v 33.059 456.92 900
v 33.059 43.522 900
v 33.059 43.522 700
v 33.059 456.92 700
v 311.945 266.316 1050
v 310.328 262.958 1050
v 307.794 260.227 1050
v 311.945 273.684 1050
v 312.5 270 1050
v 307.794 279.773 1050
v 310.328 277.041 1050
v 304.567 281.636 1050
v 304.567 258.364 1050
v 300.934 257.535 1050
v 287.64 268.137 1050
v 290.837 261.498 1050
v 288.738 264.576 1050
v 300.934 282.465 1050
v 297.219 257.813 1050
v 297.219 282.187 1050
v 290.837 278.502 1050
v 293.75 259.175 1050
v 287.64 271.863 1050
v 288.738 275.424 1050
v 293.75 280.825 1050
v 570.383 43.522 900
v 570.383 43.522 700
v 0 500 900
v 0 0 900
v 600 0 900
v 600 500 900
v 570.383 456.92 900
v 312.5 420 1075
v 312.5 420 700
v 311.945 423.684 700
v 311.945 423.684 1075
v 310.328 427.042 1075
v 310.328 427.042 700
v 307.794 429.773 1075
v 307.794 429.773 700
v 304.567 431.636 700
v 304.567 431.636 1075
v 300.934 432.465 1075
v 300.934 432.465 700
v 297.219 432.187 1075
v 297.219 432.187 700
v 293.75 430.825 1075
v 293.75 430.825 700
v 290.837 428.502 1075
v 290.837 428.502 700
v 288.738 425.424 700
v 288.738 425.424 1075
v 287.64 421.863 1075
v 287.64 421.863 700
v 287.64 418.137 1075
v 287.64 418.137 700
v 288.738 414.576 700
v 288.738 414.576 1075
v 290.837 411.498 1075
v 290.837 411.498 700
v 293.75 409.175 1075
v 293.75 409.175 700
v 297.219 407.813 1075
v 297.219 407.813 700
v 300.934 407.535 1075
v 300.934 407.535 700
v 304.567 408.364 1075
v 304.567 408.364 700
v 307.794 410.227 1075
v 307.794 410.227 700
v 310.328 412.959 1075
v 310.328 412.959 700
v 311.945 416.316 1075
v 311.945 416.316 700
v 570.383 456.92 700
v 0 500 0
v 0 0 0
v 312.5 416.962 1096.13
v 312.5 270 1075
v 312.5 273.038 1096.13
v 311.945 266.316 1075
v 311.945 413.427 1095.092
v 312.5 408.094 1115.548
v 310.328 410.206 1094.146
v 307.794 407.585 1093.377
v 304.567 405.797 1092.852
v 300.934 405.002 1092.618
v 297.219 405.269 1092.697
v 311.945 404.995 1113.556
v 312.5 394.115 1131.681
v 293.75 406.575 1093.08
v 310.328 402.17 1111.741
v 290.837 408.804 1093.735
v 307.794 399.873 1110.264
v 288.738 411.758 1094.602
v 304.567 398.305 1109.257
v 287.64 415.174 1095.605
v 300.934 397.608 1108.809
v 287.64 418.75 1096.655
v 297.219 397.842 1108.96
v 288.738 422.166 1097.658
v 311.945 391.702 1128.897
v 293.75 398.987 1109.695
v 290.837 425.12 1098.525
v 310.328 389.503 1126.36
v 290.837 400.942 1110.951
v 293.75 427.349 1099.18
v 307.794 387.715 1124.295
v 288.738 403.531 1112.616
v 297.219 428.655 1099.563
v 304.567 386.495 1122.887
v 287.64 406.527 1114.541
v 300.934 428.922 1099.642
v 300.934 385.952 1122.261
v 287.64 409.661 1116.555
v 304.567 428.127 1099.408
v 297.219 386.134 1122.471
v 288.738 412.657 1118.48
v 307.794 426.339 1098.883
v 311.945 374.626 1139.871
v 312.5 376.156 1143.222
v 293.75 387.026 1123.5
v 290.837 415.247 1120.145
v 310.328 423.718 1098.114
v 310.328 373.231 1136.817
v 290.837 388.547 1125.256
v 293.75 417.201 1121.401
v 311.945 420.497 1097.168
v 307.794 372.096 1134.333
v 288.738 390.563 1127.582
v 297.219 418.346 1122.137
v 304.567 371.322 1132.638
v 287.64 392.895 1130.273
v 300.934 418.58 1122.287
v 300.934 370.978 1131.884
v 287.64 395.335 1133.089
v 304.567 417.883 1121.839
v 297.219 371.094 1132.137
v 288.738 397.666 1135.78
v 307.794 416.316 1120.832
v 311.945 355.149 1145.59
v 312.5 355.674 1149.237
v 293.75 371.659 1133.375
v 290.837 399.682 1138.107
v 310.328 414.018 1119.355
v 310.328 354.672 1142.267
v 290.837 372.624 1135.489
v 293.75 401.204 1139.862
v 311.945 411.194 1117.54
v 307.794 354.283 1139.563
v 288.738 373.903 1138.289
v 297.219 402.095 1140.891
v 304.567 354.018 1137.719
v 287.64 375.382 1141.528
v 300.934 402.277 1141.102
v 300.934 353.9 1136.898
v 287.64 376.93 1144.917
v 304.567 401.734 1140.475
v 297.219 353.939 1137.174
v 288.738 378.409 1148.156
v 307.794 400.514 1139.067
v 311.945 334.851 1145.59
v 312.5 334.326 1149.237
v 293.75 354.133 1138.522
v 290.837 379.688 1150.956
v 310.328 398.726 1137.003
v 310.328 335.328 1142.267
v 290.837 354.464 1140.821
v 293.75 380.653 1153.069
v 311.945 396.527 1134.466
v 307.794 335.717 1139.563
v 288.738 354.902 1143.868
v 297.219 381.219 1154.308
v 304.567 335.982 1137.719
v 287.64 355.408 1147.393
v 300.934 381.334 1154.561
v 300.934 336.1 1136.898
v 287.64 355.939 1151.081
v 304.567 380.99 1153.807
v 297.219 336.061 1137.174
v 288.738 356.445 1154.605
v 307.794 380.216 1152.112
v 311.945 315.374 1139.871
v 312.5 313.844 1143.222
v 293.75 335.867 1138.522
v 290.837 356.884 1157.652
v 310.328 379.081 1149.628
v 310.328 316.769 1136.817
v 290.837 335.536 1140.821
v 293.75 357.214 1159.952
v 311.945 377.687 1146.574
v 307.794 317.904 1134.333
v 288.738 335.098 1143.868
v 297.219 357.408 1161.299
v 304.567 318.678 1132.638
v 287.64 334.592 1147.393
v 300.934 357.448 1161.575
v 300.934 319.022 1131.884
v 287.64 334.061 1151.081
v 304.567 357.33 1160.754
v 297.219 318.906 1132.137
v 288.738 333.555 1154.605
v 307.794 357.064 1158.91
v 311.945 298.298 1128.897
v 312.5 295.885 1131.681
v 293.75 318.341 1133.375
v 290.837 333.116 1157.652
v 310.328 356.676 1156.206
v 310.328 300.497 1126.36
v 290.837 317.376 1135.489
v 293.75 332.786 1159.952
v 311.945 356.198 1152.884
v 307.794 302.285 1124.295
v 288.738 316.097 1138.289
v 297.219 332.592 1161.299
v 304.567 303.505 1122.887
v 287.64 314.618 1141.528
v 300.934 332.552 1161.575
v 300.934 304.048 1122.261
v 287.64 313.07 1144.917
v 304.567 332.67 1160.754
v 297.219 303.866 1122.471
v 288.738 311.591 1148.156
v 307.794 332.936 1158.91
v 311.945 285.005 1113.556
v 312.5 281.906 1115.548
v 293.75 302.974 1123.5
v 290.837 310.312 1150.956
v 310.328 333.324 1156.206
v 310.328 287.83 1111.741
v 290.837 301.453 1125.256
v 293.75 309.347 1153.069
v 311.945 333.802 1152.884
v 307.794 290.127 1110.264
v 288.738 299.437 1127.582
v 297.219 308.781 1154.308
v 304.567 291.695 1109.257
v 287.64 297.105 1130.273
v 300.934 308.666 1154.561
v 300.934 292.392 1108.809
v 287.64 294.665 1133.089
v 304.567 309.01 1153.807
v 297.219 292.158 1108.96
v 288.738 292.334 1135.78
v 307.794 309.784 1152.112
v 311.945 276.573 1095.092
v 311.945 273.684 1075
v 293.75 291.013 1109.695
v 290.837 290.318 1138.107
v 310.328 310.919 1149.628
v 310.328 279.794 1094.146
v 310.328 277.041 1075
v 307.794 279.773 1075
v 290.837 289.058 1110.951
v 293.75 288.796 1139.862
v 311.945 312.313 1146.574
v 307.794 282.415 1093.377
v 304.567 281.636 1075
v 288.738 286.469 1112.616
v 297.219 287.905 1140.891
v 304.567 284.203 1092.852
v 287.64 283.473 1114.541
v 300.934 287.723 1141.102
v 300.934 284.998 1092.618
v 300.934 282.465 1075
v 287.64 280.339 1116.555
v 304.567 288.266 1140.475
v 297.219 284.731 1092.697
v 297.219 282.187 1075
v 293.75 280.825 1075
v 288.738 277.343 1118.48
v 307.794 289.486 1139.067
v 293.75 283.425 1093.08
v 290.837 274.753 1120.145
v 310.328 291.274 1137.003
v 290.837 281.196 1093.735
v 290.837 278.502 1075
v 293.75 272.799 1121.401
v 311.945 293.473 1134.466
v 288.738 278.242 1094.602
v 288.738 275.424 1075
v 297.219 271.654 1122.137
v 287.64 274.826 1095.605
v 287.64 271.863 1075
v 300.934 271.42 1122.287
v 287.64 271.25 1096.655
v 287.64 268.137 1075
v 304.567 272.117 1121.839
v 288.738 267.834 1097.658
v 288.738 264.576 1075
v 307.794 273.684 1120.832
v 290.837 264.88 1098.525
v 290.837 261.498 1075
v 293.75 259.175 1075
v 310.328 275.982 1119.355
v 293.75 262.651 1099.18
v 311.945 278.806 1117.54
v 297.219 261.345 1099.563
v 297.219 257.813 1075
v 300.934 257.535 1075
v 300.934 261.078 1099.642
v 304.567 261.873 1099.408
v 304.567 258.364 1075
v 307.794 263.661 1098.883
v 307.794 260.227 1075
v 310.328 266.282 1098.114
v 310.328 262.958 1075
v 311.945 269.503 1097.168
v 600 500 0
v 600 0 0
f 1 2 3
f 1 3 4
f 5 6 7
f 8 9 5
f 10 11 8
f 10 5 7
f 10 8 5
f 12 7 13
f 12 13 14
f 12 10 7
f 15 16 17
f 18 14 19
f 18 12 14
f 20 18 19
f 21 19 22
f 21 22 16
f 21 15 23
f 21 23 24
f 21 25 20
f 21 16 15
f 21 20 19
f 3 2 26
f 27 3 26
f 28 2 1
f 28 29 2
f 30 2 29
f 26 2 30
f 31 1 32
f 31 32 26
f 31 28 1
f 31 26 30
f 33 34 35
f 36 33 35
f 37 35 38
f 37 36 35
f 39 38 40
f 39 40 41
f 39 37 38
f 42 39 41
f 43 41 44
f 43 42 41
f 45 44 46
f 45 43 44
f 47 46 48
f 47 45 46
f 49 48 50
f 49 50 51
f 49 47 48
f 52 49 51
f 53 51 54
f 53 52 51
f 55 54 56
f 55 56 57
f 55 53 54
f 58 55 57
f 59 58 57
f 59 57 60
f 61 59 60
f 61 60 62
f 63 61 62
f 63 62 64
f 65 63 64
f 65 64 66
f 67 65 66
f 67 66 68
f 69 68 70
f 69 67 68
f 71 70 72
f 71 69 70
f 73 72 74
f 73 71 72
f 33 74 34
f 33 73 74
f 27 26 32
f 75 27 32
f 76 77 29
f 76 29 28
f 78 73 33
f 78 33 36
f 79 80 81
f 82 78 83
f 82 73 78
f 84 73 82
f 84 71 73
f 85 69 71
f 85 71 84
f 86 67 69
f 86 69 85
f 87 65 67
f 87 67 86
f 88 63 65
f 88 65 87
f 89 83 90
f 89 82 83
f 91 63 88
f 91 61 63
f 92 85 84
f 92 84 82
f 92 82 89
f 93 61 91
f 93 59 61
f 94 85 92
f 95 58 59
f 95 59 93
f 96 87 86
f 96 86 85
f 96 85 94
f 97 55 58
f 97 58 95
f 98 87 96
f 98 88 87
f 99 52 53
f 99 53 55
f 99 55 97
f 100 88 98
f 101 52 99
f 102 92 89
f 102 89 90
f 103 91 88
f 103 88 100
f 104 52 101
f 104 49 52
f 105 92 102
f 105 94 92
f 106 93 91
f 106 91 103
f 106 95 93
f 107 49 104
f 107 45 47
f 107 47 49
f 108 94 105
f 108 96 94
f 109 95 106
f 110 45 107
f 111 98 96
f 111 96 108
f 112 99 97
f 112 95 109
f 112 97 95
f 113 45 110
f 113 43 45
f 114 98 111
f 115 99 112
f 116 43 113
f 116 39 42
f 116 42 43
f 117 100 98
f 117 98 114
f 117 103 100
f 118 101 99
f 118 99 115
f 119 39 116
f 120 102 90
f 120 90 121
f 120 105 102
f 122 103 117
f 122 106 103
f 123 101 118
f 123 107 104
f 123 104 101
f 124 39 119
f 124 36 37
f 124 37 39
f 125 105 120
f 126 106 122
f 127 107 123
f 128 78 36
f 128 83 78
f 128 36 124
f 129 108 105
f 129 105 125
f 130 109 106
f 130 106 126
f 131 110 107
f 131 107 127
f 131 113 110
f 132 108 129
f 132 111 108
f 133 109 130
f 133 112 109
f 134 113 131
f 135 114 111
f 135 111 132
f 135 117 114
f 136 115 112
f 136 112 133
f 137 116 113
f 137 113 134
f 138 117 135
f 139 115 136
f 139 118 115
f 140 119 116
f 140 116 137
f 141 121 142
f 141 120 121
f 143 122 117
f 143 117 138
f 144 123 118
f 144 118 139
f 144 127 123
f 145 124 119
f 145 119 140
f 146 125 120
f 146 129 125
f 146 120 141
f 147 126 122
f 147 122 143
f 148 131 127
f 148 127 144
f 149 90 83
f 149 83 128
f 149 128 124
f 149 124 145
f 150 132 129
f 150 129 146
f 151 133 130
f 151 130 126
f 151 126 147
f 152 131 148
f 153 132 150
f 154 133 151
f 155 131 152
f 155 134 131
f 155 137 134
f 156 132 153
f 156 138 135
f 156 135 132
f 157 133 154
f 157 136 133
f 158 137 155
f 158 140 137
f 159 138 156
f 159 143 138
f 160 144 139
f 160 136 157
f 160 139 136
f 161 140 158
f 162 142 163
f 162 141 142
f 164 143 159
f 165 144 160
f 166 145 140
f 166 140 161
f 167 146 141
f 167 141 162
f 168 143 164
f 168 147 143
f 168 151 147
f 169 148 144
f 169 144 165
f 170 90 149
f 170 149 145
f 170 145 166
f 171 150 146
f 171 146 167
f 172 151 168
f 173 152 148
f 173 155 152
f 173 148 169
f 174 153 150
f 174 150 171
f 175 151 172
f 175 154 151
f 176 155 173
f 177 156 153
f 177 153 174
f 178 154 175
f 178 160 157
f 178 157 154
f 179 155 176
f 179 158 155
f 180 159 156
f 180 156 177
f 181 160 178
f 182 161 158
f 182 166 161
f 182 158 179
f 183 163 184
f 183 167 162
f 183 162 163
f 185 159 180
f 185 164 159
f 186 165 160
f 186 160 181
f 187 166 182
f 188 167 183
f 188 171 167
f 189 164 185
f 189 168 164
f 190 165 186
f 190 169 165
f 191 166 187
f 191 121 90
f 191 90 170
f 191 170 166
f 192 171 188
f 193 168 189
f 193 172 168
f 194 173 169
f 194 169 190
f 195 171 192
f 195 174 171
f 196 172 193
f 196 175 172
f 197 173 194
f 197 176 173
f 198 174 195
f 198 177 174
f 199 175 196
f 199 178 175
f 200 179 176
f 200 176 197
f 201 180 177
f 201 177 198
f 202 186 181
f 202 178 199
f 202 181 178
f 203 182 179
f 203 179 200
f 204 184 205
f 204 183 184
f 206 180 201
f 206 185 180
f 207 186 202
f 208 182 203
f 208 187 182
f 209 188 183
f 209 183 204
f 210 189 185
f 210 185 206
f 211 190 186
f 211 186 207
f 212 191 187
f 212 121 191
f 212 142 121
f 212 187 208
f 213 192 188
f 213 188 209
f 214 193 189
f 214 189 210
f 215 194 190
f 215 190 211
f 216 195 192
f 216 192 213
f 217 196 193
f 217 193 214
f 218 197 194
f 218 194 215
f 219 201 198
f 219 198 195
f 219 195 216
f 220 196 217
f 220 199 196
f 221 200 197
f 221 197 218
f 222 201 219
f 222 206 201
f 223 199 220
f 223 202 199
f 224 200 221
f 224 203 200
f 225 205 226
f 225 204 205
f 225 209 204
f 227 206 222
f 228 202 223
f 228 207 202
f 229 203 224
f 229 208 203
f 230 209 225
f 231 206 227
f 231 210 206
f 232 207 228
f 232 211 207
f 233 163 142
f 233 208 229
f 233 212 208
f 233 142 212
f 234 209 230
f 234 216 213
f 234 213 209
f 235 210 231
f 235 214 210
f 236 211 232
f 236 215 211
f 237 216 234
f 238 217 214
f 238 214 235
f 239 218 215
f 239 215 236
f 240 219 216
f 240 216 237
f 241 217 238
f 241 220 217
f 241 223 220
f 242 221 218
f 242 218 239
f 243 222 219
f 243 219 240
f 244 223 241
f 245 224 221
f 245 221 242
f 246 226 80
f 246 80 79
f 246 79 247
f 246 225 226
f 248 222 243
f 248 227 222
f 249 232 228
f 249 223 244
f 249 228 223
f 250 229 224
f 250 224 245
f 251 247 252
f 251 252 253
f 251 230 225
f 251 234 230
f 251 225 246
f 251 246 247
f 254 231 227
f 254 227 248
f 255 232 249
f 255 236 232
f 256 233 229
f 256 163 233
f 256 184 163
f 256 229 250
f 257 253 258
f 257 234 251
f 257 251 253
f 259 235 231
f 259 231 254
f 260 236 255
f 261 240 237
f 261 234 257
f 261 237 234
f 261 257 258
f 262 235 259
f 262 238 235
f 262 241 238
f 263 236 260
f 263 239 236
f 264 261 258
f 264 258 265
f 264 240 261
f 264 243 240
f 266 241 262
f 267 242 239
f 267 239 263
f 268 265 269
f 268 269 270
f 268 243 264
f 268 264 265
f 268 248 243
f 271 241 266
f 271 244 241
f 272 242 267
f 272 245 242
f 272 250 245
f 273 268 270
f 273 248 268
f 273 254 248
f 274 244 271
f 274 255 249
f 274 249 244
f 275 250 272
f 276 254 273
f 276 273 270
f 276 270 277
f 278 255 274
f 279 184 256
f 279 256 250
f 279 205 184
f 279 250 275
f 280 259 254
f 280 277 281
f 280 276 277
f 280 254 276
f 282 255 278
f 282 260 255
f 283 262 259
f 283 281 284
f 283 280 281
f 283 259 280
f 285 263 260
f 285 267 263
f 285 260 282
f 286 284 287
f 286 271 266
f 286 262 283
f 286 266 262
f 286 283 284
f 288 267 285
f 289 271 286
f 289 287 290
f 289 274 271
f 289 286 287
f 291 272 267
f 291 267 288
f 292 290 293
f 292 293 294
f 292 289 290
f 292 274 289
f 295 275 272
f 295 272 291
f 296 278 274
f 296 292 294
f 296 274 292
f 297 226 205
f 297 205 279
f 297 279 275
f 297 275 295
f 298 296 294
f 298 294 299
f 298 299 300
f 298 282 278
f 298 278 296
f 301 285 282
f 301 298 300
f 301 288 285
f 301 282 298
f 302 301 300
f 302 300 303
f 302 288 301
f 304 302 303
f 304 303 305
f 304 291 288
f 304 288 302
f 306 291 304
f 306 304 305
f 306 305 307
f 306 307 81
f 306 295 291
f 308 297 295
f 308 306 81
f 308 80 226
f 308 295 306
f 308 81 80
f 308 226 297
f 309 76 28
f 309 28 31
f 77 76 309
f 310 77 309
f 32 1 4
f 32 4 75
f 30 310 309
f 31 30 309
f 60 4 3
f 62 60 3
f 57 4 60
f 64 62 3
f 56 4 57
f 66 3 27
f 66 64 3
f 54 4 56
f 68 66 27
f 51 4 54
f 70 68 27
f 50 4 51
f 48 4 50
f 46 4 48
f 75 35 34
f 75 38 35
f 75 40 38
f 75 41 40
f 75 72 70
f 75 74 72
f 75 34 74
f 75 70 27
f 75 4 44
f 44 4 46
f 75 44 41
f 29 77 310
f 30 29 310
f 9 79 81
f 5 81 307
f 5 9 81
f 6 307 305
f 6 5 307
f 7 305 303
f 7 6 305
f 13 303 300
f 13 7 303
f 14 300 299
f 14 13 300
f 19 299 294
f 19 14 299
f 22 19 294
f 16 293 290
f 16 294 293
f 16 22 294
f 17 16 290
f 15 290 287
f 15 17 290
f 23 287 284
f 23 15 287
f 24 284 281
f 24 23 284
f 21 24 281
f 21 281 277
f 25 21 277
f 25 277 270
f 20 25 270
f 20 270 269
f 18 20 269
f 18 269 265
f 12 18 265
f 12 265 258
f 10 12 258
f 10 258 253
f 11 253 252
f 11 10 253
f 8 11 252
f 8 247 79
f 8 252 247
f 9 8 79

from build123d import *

# Parameters (mm, degrees)
F0_W     = 600
F0_H     = 500
F1_DEPTH = 900
F2_W     = 537.3239591718
F2_H     = 413.3979640901
F3_DEPTH = 200
F6_R     = 12.5


# Not quite as in the source:
# - a feature names something its author has since deleted; it is built from what else it names


with BuildPart() as f1:
    # F0 (on Top) → F1 (new body)
    with BuildSketch(Plane.XY):
        with Locations((300, 250)):
            Rectangle(F0_W, F0_H)
    extrude(amount=F1_DEPTH)

    # F2 (on face) → F3 (cut)
    with BuildSketch(Plane.XY.offset(900)):
        with Locations((301.7210625112, 250.2208668739)):
            Rectangle(F2_W, F2_H)
    extrude(amount=-F3_DEPTH, mode=Mode.SUBTRACT)

    # F7: sweep along a path in F5
    with BuildLine(Plane(origin=(300, 0, 0), x_dir=(0, -1, 0), z_dir=(-1, 0, 0))) as f7_path:
        Line((-420, 589.8187315079), (-420, 1075))
        ThreePointArc((-420, 1075), (-398.033008589, 1128.033008589), (-345, 1150))
        ThreePointArc((-345, 1150), (-291.966991411, 1128.033008589), (-270, 1075))
        Line((-270, 1075), (-270, 1050))
    # F6 (on face) → F7 (sweep)
    with BuildSketch(Plane.XY.offset(700)):
        with Locations((300.0000119209, 420.0000464916)):
            Circle(F6_R)
    sweep(path=f7_path.line)


solid = f1.part
